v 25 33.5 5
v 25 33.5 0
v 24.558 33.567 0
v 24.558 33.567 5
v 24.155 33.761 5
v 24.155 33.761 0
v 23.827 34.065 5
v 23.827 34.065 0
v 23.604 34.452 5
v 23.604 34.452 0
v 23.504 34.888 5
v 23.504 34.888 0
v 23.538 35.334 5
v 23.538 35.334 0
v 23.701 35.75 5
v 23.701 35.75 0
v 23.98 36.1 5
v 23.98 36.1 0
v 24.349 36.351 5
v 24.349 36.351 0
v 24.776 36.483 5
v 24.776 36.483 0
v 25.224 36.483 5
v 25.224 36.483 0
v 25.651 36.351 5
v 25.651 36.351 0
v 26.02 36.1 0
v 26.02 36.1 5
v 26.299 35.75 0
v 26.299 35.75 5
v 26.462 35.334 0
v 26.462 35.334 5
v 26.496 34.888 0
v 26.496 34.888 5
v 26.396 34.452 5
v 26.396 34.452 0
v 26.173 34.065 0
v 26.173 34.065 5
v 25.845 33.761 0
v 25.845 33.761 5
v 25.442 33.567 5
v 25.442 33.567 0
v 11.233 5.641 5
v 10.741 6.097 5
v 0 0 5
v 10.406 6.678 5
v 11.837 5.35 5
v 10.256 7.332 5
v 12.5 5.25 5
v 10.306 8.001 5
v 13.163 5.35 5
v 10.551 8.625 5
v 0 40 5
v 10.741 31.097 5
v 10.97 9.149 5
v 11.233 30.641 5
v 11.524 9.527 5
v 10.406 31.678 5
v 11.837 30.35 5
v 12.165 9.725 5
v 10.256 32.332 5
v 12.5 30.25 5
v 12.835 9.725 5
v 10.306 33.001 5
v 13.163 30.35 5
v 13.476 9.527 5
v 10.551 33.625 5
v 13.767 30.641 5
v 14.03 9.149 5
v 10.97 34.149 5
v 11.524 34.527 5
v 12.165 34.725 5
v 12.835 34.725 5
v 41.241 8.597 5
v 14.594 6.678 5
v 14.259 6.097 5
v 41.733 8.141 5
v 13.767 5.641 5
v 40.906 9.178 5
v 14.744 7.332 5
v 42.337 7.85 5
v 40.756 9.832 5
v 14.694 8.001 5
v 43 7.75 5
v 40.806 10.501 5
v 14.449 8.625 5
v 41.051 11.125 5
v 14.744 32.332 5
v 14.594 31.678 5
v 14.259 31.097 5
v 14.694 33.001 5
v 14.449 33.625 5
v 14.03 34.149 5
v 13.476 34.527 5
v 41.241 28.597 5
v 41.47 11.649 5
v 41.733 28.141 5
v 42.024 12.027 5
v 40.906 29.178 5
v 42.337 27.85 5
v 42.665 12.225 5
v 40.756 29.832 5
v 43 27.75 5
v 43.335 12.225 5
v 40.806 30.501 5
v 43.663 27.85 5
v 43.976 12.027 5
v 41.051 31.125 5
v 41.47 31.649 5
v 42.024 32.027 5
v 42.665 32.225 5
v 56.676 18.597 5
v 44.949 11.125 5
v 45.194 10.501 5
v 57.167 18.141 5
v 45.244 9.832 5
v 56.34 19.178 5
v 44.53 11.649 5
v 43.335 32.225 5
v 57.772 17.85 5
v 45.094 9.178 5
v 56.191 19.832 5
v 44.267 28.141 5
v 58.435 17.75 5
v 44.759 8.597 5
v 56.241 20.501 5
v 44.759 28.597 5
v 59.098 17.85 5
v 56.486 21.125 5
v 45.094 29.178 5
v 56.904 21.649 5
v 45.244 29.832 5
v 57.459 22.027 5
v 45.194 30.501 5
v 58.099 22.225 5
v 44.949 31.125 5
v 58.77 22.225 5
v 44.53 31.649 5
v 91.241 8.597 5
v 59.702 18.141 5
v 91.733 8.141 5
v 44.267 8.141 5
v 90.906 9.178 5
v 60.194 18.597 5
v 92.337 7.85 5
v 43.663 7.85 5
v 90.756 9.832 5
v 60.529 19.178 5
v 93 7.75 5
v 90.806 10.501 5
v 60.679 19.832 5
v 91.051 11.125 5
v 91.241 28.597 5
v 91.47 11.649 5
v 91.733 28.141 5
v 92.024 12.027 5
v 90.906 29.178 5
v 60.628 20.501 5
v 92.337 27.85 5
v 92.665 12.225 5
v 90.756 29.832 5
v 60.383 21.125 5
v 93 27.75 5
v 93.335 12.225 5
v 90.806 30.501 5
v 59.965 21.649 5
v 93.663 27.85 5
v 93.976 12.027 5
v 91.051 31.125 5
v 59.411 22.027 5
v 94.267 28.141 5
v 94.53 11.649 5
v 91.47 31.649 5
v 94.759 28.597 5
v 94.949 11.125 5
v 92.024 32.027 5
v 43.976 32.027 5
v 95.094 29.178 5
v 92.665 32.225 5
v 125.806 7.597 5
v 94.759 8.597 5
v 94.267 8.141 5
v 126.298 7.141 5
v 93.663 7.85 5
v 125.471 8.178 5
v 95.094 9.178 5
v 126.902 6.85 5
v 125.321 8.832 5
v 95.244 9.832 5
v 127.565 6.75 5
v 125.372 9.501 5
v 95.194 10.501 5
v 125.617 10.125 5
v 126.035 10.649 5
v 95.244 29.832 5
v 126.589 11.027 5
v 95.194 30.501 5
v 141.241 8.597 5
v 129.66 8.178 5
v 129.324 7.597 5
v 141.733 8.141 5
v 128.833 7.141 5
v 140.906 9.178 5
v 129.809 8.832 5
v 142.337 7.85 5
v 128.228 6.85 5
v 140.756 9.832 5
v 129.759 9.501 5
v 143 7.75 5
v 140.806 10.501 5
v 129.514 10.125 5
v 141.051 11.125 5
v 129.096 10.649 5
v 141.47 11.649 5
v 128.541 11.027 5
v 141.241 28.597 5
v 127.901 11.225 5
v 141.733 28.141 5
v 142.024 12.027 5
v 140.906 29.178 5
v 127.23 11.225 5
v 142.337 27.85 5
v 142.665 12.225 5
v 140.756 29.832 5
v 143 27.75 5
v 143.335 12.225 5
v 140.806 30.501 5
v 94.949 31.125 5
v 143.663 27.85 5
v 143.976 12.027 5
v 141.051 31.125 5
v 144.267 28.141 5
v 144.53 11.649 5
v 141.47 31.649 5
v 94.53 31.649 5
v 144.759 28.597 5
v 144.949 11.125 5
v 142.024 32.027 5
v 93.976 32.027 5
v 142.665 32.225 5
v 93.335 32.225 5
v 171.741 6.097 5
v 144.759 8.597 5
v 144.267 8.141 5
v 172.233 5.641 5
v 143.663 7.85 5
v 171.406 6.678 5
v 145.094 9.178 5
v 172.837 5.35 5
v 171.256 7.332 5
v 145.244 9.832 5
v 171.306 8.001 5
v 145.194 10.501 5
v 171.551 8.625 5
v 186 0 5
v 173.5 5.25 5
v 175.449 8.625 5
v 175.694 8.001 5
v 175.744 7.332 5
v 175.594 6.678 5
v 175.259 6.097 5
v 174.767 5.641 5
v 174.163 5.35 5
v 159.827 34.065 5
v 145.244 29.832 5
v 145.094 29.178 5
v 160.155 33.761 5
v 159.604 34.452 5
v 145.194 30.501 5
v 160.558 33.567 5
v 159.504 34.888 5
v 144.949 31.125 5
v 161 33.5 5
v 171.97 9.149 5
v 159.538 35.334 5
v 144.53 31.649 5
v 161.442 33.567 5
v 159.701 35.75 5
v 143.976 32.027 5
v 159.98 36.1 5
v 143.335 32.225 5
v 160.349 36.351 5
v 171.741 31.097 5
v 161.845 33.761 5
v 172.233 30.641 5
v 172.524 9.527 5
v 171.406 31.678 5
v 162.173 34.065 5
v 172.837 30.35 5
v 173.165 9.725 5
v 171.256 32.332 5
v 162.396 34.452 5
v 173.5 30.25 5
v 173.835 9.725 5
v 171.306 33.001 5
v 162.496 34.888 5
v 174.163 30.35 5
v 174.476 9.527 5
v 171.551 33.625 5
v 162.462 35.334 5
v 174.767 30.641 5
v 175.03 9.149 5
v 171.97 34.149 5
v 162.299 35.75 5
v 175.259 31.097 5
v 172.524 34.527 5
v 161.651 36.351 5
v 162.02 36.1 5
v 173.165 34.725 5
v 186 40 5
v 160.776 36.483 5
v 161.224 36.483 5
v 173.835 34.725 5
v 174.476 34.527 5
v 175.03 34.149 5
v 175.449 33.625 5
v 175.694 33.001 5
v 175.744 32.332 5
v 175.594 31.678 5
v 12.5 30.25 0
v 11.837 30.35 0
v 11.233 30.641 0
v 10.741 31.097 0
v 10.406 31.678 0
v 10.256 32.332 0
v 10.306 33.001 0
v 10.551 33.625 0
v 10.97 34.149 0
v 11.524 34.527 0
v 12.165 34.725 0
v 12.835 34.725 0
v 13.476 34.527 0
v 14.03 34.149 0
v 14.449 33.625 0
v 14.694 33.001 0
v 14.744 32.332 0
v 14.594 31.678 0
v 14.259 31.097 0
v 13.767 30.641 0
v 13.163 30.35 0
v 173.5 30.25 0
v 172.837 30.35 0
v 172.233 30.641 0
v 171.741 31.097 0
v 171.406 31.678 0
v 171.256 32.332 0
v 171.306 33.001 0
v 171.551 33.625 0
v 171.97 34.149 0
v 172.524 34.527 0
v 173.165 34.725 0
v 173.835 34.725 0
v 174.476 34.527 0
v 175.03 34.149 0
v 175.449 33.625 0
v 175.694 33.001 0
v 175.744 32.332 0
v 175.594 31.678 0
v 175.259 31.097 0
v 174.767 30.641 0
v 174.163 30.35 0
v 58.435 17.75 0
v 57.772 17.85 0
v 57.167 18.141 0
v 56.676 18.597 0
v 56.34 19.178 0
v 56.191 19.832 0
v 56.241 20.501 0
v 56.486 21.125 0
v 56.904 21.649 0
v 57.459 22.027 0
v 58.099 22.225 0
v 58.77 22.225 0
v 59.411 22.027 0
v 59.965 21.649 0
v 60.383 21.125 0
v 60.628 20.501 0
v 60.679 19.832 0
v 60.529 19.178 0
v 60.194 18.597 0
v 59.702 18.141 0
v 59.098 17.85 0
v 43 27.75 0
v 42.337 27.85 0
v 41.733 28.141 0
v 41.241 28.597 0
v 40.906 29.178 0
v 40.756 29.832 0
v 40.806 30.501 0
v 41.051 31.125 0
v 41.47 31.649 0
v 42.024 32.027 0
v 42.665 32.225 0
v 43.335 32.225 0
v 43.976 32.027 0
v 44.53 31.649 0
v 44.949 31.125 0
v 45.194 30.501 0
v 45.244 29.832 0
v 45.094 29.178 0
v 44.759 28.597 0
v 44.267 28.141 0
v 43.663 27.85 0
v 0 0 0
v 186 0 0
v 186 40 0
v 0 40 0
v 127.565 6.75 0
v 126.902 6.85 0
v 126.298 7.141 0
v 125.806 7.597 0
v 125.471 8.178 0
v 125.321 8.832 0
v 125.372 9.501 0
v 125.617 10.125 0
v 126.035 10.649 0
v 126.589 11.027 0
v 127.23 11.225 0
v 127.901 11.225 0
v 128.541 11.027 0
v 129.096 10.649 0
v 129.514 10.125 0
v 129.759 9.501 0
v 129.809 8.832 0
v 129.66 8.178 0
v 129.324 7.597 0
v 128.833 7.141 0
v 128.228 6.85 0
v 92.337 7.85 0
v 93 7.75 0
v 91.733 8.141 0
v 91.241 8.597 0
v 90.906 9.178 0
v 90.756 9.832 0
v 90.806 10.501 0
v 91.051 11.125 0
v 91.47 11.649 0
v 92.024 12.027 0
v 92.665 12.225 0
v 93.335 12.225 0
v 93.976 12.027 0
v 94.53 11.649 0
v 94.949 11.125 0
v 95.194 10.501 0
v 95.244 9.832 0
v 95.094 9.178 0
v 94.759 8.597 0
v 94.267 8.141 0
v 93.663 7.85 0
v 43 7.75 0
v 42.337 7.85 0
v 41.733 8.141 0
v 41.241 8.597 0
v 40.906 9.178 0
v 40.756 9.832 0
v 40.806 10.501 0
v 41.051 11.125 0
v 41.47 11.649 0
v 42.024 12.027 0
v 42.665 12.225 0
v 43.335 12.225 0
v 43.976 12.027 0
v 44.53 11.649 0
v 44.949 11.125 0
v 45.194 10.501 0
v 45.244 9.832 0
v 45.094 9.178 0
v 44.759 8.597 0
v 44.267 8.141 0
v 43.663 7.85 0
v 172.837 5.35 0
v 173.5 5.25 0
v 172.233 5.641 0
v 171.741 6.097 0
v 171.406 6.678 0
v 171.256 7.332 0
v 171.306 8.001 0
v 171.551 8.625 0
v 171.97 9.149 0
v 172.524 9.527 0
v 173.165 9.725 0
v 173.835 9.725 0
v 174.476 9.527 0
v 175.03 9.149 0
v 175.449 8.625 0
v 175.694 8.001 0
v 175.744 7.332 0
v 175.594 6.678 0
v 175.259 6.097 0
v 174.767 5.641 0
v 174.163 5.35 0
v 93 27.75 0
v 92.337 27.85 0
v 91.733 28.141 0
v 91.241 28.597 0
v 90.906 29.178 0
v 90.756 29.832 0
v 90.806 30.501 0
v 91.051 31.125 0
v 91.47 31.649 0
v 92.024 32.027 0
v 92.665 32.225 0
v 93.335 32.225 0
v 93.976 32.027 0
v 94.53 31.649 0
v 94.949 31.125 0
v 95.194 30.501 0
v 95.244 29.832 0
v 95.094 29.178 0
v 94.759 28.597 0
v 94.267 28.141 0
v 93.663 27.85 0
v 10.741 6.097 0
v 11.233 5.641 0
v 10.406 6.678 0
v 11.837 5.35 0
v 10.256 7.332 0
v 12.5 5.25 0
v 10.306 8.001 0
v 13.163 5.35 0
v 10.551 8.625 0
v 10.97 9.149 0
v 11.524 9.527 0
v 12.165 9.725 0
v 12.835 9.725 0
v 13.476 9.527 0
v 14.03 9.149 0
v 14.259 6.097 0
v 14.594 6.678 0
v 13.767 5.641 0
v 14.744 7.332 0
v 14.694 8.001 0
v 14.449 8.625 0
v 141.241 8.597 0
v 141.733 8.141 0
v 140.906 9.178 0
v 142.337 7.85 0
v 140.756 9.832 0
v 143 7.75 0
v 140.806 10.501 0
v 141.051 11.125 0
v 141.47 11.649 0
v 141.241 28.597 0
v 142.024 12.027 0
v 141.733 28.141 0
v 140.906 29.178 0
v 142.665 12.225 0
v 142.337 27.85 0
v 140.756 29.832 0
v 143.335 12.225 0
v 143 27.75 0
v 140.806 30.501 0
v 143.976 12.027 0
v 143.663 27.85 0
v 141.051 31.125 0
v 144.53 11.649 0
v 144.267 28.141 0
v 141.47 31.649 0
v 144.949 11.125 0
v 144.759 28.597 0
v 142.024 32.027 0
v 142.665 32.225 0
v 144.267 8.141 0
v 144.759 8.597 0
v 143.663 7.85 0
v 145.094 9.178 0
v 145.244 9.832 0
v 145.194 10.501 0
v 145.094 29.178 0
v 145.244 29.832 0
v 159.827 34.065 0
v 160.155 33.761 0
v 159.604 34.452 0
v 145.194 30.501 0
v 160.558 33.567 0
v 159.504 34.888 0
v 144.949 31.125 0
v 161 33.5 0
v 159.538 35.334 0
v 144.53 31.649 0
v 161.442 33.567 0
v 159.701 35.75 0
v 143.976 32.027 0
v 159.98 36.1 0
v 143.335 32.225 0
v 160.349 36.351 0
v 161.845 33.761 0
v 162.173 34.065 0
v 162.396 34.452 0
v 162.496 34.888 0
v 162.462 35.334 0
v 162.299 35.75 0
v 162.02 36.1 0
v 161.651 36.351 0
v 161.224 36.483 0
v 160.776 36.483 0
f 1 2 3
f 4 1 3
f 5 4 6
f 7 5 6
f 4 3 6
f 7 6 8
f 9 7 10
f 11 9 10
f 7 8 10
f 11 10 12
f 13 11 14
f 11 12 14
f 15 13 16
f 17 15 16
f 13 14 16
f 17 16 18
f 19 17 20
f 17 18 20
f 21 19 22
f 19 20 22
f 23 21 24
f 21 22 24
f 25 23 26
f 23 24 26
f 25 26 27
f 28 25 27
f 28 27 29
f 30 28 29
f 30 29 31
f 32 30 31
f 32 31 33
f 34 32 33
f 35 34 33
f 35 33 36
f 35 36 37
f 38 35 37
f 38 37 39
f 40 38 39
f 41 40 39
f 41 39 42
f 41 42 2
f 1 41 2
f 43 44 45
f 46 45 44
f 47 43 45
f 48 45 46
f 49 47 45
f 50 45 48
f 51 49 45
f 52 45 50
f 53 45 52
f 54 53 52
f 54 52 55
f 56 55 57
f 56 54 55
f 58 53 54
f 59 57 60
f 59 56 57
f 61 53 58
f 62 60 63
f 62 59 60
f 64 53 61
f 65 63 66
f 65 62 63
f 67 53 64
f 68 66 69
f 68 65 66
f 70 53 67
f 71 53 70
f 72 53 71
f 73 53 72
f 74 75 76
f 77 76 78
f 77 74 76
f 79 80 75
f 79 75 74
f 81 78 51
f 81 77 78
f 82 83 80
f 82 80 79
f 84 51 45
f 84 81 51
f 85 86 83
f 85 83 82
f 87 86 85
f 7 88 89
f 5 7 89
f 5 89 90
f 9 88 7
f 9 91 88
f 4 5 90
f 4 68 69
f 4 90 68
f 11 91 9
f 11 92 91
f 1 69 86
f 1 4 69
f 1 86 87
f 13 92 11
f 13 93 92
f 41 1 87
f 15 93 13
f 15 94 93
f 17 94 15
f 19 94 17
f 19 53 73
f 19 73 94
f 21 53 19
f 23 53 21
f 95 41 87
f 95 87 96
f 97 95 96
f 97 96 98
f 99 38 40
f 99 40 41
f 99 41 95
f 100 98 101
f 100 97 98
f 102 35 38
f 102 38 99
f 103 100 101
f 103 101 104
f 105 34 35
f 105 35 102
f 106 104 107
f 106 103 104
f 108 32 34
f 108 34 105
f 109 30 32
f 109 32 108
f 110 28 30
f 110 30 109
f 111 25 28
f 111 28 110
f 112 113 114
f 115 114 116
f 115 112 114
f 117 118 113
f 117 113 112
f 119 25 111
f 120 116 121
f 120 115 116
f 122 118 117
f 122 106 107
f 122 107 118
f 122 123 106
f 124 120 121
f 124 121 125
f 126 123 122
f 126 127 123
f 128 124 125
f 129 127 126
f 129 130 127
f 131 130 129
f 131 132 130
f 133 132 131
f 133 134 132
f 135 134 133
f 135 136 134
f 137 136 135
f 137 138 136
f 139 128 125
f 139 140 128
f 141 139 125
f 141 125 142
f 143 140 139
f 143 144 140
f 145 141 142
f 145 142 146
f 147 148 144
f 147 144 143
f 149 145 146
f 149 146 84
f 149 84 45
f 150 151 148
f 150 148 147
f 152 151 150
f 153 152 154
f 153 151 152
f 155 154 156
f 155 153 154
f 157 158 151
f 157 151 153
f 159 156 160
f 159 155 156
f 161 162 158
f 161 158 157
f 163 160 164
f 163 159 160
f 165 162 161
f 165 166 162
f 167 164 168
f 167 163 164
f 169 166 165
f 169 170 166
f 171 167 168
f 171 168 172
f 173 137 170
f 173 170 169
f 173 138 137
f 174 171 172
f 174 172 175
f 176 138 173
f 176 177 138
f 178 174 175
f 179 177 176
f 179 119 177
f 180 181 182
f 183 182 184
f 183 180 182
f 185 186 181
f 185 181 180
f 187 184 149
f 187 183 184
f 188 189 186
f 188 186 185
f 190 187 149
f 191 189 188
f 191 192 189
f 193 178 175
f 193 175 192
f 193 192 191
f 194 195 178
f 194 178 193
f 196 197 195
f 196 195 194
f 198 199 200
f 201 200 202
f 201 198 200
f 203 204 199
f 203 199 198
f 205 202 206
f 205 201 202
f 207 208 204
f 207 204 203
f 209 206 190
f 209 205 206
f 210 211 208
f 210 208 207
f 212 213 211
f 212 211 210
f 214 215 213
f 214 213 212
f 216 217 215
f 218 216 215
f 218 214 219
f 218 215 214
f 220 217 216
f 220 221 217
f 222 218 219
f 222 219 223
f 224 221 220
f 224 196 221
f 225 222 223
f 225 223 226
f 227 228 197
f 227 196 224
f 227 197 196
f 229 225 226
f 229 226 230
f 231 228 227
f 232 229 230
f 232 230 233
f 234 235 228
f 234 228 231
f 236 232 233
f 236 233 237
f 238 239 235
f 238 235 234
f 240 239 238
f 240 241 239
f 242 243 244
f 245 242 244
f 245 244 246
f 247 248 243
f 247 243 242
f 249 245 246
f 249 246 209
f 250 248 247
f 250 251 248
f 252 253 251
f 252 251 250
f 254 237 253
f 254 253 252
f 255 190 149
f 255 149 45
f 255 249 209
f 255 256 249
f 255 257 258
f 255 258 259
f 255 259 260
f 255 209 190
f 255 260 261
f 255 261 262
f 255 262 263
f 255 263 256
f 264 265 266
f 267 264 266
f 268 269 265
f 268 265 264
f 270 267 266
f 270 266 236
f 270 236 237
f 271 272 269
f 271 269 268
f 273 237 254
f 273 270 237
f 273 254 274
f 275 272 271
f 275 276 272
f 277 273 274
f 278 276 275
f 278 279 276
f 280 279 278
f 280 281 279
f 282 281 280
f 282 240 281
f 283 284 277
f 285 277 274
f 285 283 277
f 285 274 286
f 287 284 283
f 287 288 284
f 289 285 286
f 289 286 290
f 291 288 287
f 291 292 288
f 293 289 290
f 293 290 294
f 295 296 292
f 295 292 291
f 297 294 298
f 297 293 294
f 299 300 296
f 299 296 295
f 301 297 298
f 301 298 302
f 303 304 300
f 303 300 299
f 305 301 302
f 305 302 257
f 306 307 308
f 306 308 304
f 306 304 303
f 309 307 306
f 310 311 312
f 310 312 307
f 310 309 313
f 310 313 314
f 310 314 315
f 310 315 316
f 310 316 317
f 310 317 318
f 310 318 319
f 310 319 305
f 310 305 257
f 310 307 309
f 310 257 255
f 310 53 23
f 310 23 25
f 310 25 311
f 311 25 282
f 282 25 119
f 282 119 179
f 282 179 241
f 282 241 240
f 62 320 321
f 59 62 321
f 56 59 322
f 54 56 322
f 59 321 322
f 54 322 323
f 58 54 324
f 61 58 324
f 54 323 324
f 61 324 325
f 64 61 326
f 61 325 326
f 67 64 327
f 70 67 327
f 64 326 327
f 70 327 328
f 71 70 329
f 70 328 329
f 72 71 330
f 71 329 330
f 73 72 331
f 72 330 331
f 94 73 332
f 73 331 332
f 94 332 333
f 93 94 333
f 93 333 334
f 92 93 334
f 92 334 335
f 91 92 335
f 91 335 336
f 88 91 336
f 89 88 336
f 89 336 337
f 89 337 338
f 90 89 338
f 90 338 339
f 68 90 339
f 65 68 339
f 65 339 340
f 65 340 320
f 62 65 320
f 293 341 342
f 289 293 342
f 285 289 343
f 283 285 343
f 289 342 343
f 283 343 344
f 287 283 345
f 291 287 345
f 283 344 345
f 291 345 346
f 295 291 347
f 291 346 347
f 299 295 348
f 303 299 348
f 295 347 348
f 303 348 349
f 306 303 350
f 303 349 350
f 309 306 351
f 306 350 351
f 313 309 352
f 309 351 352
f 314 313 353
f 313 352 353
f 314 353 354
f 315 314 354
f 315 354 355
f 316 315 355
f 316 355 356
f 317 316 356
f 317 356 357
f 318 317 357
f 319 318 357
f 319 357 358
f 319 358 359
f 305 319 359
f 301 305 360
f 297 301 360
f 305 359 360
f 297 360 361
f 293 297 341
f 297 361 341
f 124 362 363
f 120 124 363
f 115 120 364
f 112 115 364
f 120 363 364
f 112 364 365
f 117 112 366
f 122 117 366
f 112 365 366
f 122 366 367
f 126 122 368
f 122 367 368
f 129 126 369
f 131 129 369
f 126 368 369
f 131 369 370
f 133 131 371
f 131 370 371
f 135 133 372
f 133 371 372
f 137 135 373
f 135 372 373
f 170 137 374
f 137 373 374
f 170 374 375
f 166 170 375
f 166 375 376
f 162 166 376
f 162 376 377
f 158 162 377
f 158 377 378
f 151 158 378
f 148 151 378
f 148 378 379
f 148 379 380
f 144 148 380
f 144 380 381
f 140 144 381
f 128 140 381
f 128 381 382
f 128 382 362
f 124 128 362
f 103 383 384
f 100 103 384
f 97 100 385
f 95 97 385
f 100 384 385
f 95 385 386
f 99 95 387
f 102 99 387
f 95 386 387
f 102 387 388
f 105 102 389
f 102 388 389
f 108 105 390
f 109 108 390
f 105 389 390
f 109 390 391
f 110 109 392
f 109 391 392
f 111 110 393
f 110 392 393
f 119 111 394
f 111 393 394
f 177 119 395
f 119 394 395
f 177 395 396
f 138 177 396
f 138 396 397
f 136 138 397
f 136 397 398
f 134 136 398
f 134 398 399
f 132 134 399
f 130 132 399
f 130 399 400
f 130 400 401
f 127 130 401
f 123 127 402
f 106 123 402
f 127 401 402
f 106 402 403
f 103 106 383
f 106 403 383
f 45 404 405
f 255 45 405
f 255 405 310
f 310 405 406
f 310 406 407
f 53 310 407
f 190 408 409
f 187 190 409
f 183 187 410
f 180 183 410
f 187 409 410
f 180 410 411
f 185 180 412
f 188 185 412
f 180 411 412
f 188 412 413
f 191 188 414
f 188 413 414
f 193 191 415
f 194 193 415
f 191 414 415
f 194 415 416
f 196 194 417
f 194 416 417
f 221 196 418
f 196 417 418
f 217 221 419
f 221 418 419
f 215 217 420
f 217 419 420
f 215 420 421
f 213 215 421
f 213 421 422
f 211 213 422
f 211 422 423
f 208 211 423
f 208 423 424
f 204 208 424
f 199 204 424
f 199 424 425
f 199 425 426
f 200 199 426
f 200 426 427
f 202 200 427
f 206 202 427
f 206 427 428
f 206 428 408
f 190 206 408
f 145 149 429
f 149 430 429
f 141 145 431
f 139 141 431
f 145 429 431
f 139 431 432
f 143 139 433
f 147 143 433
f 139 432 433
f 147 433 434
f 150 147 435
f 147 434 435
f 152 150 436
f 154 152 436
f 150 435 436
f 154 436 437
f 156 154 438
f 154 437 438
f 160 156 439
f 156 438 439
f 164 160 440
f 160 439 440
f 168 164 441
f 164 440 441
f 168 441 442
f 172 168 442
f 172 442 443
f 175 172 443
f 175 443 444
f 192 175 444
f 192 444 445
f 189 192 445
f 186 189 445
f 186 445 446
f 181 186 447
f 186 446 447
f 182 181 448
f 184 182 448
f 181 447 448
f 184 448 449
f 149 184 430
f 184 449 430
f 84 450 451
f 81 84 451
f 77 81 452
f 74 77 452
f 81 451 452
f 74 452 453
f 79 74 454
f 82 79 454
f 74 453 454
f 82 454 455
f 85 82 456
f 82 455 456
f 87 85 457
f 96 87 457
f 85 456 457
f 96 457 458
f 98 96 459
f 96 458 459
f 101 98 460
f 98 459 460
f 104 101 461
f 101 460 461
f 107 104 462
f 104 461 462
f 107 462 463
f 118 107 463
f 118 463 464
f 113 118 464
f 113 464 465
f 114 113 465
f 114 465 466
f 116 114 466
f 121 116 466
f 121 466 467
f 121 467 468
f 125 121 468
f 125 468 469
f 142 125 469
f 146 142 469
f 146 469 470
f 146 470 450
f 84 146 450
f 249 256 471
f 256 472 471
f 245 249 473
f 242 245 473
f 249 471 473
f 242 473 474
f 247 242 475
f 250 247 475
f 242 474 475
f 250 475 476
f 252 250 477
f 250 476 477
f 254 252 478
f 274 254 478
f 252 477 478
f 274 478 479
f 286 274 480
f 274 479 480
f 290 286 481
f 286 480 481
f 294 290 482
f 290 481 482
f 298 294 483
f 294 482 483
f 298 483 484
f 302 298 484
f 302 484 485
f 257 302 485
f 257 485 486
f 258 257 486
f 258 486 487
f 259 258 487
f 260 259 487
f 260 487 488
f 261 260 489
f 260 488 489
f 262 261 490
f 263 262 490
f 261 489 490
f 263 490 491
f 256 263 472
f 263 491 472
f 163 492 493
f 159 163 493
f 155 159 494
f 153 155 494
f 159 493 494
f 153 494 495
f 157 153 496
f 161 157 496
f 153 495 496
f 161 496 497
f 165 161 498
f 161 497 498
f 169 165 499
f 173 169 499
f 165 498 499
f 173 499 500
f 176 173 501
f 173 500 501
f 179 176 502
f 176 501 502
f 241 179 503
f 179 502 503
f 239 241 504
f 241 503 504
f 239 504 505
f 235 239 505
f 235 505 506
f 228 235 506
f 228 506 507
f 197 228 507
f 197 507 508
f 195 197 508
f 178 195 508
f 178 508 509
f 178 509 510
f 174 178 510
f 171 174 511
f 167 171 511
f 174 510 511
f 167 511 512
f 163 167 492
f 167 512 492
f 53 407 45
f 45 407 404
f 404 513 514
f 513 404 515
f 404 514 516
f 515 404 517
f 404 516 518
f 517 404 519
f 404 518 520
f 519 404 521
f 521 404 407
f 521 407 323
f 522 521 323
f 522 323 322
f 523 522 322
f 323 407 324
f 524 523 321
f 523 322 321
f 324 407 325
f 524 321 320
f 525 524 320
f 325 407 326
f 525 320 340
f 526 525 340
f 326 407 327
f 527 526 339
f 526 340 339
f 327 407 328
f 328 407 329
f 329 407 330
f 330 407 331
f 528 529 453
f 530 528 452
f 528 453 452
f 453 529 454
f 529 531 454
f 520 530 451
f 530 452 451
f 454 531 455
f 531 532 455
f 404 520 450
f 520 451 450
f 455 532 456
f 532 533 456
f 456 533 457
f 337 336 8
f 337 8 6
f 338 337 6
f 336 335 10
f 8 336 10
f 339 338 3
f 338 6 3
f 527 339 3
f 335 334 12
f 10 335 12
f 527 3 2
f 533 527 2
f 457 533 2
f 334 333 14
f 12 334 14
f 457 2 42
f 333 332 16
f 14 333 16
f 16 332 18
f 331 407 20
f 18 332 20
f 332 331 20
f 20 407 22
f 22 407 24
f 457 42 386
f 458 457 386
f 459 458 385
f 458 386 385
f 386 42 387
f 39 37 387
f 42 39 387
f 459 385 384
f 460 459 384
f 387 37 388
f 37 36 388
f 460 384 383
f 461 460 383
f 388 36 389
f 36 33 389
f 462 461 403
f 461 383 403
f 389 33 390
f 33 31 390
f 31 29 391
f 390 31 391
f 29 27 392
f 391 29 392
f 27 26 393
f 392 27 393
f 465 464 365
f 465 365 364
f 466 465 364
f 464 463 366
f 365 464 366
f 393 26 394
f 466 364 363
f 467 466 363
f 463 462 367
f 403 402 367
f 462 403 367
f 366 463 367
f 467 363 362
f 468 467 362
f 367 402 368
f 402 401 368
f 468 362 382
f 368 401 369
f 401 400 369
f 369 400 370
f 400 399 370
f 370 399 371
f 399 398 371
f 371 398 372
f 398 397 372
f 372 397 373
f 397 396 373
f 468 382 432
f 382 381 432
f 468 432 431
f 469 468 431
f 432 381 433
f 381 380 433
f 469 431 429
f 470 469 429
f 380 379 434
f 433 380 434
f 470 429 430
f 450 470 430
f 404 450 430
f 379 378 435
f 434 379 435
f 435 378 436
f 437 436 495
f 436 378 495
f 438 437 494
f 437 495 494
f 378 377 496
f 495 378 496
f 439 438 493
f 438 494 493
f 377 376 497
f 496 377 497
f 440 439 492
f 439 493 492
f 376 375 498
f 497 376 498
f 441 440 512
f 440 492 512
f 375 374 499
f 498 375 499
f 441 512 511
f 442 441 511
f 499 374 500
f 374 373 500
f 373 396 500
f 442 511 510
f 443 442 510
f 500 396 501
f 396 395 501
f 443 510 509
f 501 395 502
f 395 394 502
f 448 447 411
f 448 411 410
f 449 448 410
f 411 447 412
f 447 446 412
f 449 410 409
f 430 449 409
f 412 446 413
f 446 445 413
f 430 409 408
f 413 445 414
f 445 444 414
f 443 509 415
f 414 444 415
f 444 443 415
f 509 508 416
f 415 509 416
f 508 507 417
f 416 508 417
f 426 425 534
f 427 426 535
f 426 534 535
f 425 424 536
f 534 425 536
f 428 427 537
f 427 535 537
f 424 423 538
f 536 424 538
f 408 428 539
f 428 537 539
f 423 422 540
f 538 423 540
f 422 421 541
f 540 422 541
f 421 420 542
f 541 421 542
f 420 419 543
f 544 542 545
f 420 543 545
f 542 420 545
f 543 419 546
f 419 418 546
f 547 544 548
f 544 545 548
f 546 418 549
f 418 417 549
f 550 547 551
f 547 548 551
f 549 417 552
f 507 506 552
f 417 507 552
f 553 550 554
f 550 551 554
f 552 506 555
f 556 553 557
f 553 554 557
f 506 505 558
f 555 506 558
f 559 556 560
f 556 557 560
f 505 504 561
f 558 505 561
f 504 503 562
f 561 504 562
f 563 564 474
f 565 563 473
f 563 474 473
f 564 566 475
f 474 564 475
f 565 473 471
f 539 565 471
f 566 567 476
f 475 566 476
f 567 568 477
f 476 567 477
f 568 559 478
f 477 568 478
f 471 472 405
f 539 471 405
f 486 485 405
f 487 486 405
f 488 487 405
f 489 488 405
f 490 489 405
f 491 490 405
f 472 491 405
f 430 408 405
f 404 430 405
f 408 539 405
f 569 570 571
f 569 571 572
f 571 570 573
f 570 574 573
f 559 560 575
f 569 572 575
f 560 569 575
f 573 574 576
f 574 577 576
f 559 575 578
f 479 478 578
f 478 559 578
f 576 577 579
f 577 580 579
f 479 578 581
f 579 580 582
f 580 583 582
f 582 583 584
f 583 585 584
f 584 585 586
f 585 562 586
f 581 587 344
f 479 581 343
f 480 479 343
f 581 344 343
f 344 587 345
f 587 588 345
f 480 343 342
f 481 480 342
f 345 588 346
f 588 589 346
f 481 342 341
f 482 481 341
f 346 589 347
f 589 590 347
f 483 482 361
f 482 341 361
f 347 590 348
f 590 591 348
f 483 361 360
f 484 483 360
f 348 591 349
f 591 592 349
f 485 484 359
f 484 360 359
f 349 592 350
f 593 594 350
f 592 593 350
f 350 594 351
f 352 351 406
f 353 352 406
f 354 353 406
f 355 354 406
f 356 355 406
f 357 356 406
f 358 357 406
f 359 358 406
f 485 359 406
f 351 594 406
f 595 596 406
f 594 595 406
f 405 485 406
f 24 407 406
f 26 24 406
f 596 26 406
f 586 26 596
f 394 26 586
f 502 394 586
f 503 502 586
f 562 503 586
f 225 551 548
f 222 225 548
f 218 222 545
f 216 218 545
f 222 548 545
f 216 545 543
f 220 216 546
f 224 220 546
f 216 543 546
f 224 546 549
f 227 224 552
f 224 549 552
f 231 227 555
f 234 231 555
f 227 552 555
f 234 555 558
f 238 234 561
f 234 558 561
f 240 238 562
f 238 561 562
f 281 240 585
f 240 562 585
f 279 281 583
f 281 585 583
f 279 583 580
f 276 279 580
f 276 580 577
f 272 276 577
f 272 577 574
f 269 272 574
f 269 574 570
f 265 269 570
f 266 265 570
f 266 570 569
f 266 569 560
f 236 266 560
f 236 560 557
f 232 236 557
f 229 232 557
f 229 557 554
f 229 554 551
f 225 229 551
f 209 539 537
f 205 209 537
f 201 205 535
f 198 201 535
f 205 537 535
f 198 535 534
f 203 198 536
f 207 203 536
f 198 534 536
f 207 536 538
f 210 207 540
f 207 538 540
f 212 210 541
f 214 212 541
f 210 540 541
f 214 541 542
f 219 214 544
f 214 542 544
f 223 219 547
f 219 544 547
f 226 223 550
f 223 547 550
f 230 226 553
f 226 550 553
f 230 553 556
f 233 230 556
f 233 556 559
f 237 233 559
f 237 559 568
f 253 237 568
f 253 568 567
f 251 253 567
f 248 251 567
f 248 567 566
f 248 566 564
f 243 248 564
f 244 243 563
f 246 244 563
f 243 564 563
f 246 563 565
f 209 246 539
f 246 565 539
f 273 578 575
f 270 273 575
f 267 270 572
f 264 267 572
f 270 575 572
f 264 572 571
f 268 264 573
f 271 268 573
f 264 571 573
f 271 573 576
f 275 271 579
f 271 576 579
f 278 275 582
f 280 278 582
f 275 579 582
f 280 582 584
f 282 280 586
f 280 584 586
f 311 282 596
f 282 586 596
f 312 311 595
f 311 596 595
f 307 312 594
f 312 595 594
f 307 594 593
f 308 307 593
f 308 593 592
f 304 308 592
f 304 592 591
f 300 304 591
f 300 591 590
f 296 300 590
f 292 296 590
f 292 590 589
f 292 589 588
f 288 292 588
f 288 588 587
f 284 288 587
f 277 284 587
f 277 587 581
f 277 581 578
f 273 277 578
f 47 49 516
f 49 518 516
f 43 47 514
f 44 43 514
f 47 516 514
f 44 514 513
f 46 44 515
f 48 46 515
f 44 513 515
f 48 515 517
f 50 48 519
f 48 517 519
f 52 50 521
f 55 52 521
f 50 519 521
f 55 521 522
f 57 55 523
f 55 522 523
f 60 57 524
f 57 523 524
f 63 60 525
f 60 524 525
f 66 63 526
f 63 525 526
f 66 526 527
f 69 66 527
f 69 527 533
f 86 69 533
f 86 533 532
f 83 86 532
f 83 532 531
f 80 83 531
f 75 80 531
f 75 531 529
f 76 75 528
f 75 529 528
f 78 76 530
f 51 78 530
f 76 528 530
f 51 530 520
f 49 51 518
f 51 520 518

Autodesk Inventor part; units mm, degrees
ref_plane "YZ Plane" through (0, 0, 0) normal (1, 0, 0) x (0, 1, 0)
ref_plane "XZ Plane" through (0, 0, 0) normal (0, 1, 0) x (-1, 0, 0)
ref_plane "XY Plane" through (0, 0, 0) normal (0, 0, 1) x (1, 0, 0)
sketch "Sketch1" plane through (0, 0, 0) normal (0, 0, 1) x (1, 0, 0)
  line L0 (0, 0) -> (186, 0)
  line L1 (186, 0) -> (186, 40)
  line L2 (186, 40) -> (0, 40)
  line L3 (0, 40) -> (0, 0)
  dimension "d0" = 186
  dimension "d1" = 40
extrude "Extrusion1" add sketch "Sketch1" along normal blind 5
sketch "Sketch2" plane through (0, 0, 5) normal (0, 0, 1) x (1, 0, 0)
  line L0 (186, 40) -> (0, 40) projected
  line L1 (0, 0) -> (186, 0) projected
  line L2 (0, 40) -> (0, 0) projected
  point P0 (43, 30)
  point P1 (43, 10)
  dimension "d4" = 10
  dimension "d6" = 43
  dimension "d40" = 20
  dimension "d41" = 10
hole "Hole1" at (43, 30, 5) at (43, 10, 5) direction (0, 0, -1) diameter 4.5 end through all clearance for "Flat Head Machine Screw" size "M4" standard "Ansi Metric M Profile"
pattern_linear "Rectangular Pattern1" count 3 spacing 50 along (1, 0, 0) of "Hole1"
sketch "Sketch3" plane through (0, 0, 5) normal (0, 0, 1) x (1, 0, 0)
  line L0 (186, 40) -> (0, 40) projected
  line L1 (0, 40) -> (0, 0) projected
  line L2 (186, 0) -> (186, 40) projected
  point P0 (58.4348, 20)
  point P1 (127.5652, 9)
  dimension "d17" = 70
  dimension "d18" = 20
  dimension "d19" = 11
  dimension "d20" = 58.4348
  dimension "d21" = 58.4348
hole "Hole2" at (58.4348, 20, 5) at (127.5652, 9, 5) direction (0, 0, -1) diameter 4.5 end through all clearance for "Flat Head Machine Screw" size "M4" standard "Ansi Metric M Profile"
sketch "Sketch4" plane through (0, 0, 5) normal (0, 0, 1) x (1, 0, 0)
  line L0 (186, 40) -> (0, 40) projected
  line L1 (0, 0) -> (186, 0) projected
  line L2 (0, 40) -> (0, 0) projected
  line L3 (186, 0) -> (186, 40) projected
  point P0 (12.5, 32.5)
  point P1 (12.5, 7.5)
  point P2 (173.5, 32.5)
  point P3 (173.5, 7.5)
  dimension "d29" = 7.5
  dimension "d30" = 7.5
  dimension "d31" = 12.5
  dimension "d32" = 12.5
hole "Hole3" at (12.5, 32.5, 5) at (12.5, 7.5, 5) at (173.5, 32.5, 5) at (173.5, 7.5, 5) direction (0, 0, -1) diameter 4.5 end through all clearance for "Flat Head Machine Screw" size "M4" standard "Ansi Metric M Profile"
sketch "Sketch5" plane through (0, 0, 5) normal (0, 0, 1) x (1, 0, 0)
  line L0 (186, 40) -> (0, 40) projected
  line L1 (186, 0) -> (186, 40) projected
  line L2 (0, 40) -> (0, 0) projected
  point P0 (25, 35)
  point P1 (161, 35)
  dimension "d42" = 5
  dimension "d43" = 25
  dimension "d44" = 25
hole "Hole4" at (25, 35, 5) at (161, 35, 5) direction (0, 0, -1) diameter 3 end through all
equation "\"d20\" = d21"
equation "\"d30\" = d29"
equation "\"d32\" = d31"
equation "\"d44\" = d43"
properties part number "Top_Slider Piece 1_3 Lanes" material "Wood (Oak)"
